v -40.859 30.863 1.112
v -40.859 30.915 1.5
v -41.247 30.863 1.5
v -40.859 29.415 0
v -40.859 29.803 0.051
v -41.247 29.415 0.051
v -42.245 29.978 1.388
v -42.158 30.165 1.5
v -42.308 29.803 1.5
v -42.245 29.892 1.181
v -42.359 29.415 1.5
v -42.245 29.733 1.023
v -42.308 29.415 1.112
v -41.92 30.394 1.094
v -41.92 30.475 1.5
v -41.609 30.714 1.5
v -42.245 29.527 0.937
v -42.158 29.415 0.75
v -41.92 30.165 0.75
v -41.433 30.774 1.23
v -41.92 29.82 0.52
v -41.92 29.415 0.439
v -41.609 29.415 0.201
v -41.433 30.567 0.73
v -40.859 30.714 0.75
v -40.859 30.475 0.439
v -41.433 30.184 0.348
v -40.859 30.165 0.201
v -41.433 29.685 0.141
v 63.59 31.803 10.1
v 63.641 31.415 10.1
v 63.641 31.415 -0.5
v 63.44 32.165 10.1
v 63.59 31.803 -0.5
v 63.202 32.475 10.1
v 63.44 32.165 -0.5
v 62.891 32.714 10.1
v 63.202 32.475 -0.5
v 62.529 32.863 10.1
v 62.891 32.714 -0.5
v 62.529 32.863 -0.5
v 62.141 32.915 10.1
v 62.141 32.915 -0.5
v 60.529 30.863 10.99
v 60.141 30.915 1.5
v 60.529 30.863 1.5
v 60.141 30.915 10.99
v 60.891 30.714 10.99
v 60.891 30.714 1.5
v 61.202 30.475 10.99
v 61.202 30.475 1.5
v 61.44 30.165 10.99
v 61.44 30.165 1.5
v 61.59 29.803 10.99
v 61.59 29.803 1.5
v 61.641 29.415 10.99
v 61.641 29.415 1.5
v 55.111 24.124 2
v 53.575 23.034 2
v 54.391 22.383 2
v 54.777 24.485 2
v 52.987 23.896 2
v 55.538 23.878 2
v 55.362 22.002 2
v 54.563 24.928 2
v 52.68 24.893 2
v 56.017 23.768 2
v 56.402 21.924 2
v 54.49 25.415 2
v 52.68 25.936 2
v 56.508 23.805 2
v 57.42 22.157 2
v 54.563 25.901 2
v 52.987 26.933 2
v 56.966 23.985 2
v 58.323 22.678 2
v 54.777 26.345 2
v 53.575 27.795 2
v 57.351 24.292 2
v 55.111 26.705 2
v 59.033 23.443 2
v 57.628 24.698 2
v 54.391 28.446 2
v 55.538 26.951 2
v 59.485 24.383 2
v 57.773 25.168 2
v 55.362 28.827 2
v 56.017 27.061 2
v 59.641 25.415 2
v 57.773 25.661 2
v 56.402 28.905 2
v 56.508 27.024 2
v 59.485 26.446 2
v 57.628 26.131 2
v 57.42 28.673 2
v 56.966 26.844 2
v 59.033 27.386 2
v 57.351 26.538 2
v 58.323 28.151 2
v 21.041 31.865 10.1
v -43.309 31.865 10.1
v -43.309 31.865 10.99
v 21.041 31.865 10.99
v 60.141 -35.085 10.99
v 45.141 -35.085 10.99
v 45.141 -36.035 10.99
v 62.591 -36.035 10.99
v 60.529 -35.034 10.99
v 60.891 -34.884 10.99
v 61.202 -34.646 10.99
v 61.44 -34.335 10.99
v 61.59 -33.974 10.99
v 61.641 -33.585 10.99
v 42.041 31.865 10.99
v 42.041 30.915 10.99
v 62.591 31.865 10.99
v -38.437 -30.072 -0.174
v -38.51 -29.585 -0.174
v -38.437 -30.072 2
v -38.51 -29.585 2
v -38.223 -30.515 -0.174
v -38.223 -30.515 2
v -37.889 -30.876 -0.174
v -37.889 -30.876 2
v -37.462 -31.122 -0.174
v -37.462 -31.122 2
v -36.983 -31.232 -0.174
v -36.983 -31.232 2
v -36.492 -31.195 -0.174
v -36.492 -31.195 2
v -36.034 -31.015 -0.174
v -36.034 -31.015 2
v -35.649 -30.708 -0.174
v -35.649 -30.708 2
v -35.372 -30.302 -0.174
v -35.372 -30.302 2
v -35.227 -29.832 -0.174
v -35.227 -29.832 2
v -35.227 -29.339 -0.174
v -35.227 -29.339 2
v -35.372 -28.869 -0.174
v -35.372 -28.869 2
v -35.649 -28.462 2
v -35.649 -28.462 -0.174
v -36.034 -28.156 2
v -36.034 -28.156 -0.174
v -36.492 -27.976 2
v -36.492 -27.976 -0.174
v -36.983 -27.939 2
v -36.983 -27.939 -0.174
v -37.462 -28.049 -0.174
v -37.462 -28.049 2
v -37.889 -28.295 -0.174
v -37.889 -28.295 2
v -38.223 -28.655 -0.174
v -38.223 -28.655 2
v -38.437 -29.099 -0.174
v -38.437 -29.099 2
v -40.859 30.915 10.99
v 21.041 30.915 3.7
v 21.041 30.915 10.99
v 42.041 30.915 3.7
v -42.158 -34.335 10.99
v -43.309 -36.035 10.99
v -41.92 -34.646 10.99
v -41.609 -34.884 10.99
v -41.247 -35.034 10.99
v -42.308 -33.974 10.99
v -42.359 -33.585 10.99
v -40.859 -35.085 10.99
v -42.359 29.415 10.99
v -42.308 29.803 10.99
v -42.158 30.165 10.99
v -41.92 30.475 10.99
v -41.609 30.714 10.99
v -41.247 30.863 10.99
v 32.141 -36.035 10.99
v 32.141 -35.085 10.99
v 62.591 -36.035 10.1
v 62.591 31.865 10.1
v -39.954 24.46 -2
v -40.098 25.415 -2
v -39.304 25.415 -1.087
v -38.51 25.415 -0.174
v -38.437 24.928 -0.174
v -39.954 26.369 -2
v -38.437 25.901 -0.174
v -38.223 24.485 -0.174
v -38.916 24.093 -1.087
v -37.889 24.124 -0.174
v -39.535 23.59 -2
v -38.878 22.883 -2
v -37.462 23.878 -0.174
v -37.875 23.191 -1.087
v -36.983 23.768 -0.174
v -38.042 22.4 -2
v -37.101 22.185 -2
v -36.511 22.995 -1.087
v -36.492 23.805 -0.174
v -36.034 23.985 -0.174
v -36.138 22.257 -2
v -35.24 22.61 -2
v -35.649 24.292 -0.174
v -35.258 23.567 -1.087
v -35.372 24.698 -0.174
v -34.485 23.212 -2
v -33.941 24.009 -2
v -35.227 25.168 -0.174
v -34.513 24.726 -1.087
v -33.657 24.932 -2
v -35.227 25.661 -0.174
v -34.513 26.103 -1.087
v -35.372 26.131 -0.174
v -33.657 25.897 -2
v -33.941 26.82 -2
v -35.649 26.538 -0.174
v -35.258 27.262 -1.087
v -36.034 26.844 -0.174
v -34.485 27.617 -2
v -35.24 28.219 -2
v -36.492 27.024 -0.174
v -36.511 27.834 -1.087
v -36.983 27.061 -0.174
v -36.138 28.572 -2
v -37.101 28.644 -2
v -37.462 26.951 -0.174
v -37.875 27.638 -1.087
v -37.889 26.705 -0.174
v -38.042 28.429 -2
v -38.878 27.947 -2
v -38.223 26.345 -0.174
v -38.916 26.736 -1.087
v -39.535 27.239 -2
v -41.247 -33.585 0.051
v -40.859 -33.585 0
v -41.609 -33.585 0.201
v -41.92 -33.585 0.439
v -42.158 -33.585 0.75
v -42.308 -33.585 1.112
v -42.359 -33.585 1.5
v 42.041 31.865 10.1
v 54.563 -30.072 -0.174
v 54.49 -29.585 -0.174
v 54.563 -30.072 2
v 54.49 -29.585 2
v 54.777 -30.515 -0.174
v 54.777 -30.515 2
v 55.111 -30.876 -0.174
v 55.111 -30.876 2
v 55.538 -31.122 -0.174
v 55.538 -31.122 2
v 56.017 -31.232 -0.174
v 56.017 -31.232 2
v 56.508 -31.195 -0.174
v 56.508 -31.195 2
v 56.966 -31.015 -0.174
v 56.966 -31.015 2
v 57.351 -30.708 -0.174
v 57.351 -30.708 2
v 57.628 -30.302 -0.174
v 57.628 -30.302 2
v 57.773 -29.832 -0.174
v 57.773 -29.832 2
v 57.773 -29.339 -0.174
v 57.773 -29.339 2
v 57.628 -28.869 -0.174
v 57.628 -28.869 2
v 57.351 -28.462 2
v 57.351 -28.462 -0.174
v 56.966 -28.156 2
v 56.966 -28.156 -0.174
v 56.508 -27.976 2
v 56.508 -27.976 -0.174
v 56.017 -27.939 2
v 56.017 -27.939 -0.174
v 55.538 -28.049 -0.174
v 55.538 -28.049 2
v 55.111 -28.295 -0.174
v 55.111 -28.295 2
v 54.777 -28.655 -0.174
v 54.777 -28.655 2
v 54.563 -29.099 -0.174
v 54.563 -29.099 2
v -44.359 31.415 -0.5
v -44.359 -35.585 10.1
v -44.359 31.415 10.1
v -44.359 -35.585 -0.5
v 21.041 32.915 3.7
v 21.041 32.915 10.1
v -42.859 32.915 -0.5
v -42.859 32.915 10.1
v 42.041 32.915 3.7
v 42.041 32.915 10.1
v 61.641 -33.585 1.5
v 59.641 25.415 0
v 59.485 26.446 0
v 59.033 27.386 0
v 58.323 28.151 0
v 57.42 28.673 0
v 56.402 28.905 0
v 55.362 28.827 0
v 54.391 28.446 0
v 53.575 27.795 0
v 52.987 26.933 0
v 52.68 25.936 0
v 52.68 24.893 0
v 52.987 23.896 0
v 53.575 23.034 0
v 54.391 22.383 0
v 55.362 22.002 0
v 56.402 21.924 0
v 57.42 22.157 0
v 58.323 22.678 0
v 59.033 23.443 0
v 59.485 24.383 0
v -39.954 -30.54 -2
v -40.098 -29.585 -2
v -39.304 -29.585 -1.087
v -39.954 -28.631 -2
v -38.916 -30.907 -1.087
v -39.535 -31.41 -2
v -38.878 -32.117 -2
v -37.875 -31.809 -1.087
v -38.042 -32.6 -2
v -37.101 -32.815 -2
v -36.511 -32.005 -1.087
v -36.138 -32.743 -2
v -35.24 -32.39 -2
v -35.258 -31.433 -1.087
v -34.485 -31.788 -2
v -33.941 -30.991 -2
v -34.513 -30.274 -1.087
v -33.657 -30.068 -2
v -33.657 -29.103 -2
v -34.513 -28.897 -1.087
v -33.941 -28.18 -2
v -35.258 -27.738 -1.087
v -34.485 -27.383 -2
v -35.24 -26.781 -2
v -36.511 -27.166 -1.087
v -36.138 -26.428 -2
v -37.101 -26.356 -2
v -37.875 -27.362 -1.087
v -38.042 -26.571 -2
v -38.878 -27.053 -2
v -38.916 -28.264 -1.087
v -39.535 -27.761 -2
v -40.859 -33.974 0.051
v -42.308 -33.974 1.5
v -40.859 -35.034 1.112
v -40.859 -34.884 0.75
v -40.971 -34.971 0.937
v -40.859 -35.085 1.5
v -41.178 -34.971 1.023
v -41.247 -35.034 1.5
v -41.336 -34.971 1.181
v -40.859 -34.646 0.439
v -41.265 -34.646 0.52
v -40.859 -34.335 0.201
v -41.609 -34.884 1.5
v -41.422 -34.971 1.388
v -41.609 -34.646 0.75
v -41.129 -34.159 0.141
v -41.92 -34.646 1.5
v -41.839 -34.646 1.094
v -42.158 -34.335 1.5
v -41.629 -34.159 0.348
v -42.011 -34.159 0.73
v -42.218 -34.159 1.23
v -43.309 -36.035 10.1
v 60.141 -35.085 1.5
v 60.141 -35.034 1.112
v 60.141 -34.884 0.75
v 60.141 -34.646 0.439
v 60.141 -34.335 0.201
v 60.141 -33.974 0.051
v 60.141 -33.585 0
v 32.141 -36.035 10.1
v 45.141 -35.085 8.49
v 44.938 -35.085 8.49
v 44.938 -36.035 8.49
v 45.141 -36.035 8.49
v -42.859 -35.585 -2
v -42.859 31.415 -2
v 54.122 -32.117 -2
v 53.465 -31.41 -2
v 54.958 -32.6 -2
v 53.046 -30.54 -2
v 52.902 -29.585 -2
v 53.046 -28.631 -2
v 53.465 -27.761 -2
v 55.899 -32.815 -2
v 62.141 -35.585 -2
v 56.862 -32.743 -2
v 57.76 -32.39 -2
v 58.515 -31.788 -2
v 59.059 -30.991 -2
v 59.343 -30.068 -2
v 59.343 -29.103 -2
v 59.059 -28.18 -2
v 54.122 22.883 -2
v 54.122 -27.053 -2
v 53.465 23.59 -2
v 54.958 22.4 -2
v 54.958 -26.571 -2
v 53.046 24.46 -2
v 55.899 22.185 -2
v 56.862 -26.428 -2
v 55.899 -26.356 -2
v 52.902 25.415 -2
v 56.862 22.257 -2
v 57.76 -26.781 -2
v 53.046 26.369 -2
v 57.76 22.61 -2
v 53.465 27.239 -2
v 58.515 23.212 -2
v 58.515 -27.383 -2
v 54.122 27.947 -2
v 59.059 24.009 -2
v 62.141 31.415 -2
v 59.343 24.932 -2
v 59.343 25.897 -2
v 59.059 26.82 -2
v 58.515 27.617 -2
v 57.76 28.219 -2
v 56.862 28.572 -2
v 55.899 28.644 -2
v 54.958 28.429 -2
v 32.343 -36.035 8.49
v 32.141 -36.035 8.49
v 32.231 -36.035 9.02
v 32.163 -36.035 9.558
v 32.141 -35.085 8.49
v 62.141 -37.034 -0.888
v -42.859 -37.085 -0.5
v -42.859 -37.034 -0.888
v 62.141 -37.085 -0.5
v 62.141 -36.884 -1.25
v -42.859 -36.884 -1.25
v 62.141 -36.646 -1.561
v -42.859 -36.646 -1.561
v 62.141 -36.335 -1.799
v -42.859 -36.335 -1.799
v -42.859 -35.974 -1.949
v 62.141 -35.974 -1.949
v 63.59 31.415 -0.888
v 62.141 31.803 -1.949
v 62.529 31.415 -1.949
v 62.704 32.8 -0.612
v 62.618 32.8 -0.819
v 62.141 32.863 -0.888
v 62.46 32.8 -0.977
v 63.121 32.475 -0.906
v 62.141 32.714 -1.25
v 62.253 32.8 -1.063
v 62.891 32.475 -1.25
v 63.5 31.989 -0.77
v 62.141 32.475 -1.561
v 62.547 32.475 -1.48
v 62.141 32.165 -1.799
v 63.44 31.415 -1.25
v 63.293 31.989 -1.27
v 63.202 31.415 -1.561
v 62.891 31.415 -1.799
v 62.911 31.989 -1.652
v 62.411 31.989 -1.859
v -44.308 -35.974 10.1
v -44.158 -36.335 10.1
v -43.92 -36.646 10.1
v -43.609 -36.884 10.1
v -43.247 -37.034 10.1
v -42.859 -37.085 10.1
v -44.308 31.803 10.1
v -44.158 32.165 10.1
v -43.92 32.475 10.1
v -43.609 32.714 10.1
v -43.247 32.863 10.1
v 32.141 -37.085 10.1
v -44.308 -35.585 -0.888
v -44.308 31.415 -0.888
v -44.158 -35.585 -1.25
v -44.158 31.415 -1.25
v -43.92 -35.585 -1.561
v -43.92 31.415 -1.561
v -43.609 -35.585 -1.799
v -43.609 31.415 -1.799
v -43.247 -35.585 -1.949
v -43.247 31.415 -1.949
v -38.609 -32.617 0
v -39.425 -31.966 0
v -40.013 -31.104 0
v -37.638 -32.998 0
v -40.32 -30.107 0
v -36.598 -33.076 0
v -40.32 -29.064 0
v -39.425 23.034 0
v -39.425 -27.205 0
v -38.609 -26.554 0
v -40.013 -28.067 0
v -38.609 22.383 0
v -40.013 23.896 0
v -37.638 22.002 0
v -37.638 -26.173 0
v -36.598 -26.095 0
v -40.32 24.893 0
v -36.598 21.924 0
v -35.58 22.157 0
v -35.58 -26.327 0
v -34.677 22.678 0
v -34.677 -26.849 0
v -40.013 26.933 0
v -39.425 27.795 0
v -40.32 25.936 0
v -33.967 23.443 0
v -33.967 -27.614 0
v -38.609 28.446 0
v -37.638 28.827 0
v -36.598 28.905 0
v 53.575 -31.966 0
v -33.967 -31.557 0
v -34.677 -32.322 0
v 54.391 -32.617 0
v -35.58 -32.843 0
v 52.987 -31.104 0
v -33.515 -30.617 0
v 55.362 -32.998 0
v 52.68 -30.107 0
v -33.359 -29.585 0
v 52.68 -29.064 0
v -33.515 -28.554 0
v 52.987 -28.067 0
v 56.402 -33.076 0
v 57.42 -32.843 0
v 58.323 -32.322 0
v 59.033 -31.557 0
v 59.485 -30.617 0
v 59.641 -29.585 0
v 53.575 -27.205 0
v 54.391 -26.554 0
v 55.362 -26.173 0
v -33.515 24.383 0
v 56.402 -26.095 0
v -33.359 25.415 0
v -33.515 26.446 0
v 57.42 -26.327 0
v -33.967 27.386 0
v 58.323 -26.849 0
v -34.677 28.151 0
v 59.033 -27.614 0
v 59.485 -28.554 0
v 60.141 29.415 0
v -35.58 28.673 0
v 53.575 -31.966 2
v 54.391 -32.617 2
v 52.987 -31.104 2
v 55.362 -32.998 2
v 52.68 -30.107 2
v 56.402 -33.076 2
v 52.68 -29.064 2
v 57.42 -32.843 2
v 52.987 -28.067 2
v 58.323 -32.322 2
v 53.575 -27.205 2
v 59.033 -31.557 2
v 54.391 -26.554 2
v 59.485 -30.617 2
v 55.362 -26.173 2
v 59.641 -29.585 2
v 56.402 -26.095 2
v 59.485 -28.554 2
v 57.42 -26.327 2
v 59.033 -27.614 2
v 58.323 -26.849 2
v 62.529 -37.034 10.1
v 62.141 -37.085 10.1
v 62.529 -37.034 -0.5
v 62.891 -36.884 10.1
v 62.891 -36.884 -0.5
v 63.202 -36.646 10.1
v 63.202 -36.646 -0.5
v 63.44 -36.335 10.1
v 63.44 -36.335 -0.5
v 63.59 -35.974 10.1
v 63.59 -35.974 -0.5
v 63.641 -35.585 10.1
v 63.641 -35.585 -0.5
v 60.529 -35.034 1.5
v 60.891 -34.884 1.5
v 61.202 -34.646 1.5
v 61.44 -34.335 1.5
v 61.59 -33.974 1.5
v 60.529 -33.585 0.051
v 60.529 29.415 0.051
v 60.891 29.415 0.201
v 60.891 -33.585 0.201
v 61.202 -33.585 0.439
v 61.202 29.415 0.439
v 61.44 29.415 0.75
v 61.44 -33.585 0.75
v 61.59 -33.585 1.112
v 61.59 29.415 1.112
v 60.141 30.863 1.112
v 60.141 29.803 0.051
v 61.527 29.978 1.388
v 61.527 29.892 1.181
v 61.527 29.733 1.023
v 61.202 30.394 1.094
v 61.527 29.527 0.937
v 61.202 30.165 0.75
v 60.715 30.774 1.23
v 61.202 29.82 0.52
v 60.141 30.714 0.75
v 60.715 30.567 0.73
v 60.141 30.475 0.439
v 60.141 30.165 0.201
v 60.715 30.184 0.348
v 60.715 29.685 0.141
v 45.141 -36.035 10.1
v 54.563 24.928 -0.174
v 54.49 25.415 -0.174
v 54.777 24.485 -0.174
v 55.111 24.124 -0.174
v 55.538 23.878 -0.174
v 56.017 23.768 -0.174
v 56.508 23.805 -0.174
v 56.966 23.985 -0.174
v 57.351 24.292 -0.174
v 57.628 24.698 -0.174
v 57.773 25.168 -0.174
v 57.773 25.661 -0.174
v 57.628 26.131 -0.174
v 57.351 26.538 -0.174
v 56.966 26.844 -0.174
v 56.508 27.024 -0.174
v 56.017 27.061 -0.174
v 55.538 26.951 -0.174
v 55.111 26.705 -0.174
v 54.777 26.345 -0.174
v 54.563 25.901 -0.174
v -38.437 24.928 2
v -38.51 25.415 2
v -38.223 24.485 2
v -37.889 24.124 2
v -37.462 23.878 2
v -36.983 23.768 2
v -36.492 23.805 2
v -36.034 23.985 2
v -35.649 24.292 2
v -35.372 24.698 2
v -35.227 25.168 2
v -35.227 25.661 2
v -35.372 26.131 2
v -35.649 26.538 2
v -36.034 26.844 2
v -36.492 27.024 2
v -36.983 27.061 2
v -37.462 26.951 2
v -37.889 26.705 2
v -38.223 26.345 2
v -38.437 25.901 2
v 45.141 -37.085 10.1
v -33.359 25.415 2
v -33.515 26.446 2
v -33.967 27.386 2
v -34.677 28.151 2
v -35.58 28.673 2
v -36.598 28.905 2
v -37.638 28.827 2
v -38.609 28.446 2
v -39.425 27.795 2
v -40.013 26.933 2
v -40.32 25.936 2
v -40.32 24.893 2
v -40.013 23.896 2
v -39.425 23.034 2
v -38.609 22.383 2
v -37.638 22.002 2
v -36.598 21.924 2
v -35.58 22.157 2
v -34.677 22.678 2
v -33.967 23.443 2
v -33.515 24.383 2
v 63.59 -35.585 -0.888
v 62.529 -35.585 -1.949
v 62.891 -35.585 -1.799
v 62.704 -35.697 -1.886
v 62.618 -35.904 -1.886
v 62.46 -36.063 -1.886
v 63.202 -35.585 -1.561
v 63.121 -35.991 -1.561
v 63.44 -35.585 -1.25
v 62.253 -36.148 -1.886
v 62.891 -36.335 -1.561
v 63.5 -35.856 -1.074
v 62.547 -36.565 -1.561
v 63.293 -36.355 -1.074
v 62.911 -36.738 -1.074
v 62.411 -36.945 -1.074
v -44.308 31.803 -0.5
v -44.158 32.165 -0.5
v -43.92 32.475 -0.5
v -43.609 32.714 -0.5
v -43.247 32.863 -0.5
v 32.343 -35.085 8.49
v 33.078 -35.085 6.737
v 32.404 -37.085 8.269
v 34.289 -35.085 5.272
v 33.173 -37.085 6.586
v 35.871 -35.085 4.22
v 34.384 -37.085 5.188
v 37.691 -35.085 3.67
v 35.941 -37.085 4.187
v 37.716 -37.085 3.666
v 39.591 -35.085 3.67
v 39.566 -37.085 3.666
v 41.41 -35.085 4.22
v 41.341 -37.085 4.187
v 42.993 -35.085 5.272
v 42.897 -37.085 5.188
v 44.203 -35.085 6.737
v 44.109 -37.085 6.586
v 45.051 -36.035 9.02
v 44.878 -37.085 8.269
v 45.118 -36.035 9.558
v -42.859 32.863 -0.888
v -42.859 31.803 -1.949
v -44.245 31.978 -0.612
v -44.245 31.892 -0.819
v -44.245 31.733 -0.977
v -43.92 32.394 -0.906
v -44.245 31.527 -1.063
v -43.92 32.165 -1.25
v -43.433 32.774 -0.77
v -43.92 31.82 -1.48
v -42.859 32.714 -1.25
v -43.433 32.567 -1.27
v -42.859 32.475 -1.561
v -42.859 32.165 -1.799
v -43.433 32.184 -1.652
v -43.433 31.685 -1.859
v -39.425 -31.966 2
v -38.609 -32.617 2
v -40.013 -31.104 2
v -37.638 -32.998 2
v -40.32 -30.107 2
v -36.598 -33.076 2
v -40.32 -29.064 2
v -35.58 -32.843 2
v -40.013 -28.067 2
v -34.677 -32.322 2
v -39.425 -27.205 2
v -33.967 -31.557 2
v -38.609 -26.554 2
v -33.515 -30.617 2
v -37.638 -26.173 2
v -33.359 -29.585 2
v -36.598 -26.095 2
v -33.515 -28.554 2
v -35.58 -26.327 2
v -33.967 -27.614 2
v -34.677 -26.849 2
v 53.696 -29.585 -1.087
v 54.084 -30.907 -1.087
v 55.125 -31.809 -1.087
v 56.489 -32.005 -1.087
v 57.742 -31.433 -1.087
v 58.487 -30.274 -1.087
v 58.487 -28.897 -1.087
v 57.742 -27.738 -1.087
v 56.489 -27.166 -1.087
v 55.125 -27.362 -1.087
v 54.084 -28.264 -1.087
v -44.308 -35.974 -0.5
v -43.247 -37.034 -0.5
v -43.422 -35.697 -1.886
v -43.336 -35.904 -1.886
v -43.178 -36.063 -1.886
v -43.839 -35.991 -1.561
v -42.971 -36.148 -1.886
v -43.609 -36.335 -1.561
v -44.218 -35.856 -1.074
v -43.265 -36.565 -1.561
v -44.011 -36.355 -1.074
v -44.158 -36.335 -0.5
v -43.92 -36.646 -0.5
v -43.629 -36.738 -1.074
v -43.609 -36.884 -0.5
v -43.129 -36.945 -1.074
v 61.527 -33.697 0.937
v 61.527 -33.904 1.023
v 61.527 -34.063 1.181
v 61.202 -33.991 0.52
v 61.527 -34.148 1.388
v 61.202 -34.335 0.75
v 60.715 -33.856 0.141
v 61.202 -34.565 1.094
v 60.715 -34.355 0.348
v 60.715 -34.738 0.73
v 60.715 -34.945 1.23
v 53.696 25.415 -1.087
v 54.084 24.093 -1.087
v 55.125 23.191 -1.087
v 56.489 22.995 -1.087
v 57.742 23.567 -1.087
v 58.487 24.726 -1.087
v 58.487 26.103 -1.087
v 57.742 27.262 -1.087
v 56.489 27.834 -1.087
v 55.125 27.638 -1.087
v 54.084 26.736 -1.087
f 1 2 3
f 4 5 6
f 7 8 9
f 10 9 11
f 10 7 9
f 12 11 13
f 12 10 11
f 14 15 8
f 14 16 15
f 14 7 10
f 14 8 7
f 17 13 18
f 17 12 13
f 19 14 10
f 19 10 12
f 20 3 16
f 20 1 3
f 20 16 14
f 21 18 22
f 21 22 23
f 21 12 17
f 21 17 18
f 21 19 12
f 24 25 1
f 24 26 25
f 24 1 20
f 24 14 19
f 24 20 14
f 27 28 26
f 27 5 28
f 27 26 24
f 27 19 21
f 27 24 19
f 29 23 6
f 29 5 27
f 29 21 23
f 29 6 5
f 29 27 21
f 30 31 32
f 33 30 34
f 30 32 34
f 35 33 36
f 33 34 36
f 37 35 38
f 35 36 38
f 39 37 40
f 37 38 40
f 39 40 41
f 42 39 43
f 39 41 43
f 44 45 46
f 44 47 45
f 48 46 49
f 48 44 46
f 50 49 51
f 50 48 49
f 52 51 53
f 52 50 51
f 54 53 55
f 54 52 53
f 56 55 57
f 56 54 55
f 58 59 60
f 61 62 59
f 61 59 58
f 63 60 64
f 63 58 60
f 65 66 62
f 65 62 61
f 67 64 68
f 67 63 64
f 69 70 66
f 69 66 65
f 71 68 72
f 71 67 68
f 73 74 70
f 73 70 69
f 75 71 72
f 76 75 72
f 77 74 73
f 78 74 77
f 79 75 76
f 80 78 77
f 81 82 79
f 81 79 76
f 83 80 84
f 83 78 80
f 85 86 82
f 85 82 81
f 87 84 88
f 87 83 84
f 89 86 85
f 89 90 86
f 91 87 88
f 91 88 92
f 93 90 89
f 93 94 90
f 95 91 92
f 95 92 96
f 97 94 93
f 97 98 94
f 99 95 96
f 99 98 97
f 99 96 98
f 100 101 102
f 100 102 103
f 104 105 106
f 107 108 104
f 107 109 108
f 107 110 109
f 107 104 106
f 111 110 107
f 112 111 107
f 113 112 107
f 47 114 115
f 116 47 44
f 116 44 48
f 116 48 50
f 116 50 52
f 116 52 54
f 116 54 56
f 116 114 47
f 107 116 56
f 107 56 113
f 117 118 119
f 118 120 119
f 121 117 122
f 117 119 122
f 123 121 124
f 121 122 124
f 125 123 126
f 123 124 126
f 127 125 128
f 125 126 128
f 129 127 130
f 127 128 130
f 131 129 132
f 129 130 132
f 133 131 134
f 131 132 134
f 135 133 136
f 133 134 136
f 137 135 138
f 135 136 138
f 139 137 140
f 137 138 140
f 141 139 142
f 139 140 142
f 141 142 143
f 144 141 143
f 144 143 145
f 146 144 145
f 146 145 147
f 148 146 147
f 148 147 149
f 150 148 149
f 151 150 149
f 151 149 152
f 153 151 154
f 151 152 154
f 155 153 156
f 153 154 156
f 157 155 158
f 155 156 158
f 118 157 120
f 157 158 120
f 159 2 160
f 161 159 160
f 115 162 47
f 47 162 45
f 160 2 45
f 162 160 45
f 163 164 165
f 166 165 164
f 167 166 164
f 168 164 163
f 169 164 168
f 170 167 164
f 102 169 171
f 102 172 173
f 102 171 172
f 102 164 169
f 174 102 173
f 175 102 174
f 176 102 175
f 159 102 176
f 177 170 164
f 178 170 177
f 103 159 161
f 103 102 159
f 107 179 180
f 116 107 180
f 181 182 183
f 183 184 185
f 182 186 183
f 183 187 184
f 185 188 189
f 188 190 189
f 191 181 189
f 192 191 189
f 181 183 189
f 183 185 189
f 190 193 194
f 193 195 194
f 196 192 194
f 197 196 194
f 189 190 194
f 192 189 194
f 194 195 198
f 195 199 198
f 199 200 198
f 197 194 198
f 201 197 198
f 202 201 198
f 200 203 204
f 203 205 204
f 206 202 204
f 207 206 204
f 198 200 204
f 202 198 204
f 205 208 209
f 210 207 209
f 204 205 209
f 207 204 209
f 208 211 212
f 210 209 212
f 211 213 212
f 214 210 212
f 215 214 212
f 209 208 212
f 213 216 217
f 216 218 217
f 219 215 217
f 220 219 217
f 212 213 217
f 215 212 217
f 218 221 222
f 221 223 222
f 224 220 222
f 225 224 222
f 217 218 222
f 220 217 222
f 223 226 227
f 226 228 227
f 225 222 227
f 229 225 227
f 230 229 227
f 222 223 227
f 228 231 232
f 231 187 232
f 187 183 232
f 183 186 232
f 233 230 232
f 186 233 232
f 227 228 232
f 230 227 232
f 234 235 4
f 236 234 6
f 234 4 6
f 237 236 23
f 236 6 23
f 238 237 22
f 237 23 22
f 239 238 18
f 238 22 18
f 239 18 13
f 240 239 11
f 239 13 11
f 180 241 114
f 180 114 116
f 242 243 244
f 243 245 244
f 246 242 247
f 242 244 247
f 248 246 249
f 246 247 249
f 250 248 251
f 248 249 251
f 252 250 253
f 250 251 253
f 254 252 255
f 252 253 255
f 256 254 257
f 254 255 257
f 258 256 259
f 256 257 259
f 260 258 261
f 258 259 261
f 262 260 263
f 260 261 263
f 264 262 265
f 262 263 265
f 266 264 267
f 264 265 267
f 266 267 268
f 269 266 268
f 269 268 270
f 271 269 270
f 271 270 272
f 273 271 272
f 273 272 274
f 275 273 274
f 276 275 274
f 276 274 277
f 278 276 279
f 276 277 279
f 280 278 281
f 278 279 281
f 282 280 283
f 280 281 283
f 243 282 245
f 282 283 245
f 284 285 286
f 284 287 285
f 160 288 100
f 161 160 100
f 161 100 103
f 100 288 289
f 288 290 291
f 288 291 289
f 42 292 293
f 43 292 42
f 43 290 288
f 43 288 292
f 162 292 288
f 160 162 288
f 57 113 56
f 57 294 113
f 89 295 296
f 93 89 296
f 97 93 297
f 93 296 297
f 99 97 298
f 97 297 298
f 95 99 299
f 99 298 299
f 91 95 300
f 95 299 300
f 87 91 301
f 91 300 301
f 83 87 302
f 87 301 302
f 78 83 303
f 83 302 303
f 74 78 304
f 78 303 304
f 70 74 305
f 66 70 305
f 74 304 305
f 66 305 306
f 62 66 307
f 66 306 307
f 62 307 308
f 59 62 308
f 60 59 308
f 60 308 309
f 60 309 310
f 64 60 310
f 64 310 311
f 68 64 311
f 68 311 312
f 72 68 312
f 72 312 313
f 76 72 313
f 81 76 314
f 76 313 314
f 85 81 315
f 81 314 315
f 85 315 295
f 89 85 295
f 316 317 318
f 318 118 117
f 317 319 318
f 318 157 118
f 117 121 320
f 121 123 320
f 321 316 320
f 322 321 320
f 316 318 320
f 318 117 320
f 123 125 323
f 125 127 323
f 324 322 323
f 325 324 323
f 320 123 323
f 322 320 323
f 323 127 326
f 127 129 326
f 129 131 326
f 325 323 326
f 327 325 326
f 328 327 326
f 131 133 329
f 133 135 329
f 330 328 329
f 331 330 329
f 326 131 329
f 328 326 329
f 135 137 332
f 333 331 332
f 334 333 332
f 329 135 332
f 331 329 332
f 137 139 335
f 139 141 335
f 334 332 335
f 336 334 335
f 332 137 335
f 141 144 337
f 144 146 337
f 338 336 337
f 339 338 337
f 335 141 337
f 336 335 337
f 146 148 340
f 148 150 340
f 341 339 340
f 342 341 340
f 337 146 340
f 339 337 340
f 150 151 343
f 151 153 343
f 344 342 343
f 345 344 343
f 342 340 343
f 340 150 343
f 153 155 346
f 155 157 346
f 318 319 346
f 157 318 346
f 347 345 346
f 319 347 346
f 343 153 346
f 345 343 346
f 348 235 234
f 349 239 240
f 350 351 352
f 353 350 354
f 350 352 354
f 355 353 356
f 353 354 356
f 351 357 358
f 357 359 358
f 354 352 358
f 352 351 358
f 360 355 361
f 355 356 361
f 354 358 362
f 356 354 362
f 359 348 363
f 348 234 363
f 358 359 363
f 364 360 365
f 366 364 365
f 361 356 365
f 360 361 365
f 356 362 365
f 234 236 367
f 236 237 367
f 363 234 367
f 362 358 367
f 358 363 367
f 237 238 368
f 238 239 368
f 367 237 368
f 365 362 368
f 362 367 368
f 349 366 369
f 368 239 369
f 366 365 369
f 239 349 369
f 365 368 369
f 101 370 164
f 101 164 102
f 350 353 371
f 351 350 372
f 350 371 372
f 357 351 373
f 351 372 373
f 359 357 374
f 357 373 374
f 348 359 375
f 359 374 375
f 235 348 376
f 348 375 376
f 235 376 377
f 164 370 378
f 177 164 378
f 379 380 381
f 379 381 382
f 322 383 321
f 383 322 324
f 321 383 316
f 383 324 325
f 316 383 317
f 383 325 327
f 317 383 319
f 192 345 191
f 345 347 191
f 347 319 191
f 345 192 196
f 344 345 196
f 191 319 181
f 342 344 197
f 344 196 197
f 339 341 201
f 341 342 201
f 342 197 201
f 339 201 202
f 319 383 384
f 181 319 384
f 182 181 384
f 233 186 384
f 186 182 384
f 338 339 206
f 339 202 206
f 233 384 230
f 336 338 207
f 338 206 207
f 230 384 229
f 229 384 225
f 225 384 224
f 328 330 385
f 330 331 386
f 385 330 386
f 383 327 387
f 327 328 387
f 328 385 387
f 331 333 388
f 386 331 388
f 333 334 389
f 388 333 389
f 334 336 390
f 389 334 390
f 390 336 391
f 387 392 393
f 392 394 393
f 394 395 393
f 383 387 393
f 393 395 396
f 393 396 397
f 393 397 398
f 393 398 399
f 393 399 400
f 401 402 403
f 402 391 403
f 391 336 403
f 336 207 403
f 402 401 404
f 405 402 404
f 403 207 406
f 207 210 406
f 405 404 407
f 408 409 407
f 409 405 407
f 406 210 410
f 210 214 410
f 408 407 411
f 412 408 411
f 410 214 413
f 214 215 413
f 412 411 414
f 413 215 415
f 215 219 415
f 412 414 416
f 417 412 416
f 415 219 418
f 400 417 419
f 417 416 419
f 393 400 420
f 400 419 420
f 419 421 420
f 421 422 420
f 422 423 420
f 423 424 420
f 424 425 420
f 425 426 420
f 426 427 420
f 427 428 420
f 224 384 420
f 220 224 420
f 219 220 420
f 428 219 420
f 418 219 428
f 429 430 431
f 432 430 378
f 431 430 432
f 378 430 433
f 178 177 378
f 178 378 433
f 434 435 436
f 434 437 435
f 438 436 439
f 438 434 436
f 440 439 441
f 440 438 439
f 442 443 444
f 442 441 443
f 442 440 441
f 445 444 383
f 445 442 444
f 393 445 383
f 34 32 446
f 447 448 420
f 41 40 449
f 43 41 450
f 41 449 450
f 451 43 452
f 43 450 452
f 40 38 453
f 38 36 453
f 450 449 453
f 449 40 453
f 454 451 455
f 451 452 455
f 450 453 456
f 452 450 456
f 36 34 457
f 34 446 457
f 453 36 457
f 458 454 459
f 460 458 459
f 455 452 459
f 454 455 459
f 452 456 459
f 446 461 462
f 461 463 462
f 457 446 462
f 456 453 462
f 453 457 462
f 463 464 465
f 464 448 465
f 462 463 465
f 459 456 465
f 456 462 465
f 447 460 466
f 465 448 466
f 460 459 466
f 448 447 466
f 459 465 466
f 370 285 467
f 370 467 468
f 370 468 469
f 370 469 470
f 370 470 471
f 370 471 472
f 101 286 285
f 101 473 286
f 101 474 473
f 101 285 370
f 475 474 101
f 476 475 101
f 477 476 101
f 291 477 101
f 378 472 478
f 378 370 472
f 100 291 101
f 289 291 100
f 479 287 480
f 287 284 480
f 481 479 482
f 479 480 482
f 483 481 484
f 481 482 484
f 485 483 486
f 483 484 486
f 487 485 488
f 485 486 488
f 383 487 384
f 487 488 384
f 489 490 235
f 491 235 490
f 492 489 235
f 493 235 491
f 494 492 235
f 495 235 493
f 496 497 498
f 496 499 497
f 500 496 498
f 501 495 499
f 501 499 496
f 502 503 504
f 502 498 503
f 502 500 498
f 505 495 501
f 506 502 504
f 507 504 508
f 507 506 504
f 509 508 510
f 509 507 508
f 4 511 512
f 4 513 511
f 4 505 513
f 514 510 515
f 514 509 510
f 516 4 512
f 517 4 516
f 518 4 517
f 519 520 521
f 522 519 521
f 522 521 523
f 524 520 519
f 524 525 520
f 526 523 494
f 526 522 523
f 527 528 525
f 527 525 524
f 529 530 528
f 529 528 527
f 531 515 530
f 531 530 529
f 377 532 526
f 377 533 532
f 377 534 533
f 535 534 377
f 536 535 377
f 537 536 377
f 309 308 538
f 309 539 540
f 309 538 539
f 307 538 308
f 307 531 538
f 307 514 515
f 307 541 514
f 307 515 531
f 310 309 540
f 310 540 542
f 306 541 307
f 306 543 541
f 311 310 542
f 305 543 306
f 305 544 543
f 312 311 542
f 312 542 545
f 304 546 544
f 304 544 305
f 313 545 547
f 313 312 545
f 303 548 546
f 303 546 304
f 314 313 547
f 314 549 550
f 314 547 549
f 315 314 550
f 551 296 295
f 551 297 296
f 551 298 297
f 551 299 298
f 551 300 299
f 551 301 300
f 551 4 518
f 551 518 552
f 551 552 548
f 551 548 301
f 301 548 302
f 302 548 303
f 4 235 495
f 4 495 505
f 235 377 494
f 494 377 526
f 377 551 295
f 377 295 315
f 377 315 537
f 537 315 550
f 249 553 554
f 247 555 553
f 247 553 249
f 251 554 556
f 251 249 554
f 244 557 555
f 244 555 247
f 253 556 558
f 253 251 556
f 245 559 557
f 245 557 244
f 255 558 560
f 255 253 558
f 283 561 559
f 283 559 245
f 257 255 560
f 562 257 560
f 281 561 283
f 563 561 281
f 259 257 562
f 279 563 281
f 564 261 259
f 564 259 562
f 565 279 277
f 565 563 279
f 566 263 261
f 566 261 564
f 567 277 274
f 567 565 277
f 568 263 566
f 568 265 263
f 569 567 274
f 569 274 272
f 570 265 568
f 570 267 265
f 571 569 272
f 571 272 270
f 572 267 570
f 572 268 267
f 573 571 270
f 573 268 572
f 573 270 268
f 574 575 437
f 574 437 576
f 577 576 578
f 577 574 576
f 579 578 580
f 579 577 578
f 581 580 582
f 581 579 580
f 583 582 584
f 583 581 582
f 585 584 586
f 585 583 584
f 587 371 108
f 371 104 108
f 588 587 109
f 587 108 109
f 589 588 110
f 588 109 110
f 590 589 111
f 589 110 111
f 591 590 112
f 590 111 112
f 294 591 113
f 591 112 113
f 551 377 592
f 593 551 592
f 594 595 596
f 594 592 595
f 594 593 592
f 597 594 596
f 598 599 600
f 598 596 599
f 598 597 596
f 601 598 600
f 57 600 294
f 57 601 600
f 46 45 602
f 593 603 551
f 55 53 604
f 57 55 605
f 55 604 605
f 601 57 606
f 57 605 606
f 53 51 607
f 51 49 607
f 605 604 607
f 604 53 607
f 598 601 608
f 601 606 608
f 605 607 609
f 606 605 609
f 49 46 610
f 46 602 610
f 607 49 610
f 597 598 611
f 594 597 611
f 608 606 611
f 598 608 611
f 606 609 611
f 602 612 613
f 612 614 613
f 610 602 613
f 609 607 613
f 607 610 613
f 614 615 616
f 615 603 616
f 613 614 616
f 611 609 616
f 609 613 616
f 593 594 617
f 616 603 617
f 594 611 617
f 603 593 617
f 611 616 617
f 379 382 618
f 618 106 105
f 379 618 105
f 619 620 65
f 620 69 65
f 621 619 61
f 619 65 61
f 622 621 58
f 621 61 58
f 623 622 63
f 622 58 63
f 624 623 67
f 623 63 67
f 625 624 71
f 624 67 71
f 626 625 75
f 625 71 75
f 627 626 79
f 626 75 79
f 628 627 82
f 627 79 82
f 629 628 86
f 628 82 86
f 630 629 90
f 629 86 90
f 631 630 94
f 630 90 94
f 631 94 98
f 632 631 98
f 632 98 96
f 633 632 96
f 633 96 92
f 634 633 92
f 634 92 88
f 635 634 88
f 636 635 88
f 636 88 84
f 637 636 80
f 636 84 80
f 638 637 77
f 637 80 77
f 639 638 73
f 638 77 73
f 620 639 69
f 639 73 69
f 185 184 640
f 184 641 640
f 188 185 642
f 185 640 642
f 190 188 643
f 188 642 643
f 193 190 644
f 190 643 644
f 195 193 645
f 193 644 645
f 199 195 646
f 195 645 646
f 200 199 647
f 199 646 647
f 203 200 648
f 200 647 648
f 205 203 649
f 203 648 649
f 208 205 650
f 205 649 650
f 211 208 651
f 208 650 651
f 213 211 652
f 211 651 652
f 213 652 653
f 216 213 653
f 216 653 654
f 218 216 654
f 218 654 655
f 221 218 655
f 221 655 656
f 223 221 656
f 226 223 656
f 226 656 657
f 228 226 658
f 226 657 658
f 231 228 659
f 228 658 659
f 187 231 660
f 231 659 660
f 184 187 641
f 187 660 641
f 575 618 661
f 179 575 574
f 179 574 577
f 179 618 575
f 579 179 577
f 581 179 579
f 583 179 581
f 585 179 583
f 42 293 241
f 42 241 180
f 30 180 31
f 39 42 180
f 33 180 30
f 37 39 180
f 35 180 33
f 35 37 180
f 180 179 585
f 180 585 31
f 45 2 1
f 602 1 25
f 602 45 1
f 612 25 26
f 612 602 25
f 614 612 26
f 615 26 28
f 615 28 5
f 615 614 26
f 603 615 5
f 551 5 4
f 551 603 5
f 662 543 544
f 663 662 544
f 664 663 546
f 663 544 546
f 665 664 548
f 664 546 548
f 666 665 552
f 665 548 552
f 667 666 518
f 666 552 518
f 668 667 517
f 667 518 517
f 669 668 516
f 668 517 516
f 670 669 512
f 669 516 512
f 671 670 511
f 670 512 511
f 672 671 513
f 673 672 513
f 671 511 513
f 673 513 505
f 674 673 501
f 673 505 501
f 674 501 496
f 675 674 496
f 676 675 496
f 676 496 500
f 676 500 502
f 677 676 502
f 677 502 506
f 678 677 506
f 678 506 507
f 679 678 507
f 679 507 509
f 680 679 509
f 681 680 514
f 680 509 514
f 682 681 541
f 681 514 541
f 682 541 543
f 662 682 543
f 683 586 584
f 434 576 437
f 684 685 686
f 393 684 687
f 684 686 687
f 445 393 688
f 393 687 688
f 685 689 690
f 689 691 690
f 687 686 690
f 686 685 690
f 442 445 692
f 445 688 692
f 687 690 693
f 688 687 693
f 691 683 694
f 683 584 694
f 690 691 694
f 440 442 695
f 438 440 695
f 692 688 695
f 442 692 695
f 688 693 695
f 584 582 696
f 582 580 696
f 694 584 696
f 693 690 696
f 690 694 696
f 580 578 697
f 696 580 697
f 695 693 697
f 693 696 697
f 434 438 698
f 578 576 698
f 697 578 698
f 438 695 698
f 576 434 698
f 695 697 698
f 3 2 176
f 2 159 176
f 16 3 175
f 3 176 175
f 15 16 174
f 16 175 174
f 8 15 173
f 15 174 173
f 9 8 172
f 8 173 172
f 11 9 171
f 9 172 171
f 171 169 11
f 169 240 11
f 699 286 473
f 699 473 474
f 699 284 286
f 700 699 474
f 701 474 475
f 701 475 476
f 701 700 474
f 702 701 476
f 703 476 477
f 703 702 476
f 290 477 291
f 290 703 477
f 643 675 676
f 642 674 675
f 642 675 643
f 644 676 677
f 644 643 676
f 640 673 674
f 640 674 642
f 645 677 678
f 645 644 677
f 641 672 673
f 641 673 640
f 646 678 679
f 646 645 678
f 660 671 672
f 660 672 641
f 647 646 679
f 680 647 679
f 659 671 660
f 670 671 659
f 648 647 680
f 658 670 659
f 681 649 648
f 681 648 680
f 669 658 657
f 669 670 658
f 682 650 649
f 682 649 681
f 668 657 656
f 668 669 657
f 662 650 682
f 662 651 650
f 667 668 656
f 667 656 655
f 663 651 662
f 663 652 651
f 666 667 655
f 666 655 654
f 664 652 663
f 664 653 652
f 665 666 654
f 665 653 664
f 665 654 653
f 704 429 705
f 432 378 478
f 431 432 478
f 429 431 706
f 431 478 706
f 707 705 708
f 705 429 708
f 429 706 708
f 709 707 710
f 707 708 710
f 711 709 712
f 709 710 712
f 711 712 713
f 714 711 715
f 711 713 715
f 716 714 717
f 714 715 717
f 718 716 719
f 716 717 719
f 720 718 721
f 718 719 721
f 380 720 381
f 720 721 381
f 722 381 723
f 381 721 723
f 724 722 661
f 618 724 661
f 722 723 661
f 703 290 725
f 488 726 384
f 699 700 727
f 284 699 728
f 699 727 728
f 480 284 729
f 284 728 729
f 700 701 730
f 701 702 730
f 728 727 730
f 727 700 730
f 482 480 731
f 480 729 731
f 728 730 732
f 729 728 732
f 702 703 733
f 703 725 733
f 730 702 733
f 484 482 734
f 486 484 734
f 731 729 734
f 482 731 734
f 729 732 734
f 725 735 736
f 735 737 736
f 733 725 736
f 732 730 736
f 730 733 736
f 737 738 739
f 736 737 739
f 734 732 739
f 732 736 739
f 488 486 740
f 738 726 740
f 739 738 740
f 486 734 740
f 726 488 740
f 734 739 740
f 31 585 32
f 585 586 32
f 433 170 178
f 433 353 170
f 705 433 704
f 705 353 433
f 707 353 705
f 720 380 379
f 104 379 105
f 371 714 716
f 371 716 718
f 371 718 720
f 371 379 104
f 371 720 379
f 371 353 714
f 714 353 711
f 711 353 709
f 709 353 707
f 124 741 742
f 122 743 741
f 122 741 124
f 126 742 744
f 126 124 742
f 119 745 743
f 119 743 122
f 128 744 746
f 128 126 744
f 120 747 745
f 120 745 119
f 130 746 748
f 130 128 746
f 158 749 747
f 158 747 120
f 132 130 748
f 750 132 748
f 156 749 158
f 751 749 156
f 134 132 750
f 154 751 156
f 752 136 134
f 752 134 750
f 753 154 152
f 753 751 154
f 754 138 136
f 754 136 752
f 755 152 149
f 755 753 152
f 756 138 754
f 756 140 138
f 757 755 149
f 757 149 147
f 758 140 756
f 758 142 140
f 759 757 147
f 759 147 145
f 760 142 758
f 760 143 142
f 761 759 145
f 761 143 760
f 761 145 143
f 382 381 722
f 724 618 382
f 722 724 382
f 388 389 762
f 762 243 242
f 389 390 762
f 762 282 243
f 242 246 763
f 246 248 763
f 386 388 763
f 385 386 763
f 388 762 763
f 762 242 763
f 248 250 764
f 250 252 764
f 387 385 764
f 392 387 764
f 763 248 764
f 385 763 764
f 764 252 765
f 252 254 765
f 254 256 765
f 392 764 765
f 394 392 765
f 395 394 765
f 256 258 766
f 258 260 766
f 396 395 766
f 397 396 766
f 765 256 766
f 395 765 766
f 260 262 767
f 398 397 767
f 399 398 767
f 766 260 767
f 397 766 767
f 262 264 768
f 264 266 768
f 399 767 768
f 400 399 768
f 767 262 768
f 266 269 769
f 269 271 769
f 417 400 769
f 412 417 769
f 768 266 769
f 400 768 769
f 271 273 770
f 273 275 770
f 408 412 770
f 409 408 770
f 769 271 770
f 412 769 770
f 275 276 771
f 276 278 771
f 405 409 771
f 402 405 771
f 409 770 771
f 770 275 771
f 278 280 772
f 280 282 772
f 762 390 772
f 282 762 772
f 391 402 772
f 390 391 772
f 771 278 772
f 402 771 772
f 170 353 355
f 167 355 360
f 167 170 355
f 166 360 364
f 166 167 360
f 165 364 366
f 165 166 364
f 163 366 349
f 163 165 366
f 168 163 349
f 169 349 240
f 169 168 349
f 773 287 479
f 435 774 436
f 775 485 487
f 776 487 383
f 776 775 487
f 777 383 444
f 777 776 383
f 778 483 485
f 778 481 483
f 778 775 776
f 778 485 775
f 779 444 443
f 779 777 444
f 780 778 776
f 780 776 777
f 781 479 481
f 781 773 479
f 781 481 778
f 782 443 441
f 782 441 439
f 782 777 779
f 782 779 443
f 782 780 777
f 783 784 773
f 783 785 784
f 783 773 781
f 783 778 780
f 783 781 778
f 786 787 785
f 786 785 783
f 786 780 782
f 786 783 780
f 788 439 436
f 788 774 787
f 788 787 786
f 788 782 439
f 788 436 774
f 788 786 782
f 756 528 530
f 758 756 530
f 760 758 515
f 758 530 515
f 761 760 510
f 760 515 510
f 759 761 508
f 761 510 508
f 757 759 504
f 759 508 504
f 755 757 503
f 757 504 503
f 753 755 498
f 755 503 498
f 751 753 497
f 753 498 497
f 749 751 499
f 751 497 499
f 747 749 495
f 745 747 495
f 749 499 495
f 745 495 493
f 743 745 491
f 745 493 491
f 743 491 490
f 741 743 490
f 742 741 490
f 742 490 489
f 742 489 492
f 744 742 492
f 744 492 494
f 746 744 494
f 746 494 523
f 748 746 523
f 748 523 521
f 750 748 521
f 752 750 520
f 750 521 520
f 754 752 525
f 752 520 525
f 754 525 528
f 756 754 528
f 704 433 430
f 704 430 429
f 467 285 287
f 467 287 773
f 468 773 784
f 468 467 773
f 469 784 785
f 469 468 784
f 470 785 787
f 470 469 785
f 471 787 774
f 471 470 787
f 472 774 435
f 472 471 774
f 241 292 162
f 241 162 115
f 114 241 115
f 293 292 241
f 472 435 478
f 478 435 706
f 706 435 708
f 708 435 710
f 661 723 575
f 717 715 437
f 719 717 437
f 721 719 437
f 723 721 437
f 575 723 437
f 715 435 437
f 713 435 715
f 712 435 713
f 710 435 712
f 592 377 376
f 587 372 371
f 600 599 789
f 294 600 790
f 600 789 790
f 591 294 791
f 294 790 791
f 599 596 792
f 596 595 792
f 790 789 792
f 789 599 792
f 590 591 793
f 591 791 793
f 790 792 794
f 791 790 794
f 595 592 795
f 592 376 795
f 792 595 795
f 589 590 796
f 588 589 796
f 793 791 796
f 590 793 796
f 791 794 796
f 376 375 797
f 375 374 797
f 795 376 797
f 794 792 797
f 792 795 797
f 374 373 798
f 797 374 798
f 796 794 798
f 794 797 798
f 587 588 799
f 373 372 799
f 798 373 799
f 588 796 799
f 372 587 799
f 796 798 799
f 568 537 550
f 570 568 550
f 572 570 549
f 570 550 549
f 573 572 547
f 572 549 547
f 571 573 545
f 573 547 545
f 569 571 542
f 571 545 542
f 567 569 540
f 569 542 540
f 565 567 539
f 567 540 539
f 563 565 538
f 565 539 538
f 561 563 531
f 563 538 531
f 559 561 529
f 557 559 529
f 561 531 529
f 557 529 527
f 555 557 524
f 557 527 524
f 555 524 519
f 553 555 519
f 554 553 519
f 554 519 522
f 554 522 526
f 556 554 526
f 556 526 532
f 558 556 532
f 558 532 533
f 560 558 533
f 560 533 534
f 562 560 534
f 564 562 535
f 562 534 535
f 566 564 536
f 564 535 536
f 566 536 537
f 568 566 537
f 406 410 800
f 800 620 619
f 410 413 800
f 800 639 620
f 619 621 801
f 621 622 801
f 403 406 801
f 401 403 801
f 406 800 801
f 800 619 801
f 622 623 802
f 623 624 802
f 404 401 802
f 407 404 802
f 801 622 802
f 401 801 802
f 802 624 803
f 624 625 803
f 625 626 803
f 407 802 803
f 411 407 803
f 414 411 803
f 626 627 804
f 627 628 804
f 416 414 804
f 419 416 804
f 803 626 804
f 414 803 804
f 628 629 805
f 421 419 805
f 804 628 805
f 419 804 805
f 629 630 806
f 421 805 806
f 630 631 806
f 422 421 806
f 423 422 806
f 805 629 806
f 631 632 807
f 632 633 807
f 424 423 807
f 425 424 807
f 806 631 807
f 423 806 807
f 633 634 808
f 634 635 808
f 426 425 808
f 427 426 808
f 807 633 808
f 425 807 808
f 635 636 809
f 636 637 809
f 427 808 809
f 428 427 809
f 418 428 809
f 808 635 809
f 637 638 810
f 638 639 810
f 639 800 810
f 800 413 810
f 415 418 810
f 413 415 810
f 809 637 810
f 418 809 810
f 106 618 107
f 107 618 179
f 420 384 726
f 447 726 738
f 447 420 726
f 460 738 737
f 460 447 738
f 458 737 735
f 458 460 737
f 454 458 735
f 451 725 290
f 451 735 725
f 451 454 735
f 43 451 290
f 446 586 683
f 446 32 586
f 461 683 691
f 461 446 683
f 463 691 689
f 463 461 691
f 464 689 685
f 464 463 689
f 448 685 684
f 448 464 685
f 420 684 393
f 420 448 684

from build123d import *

# Parameters (mm, degrees)
F0_W           = 108
F0_H           = 70
F0_W_2         = 105.9
F0_H_2         = 67.9
F0_W_3         = 104
F0_H_3         = 66
F0_R           = 3
F1_DEPTH       = 2
F2_DEPTH       = 10.99
F3_DEPTH       = 10.1
F4_R           = 3.5
F5_DEPTH       = 2
F7_D           = 3.302
F7_CSINK_D     = 6.477
F7_CSINK_ANGLE = 82
F8_W           = 21
F8_H           = 6.4
F9_DEPTH       = 2.5
F10_W          = 13
F10_H          = 0.95
F11_DEPTH      = 2.5
F13_DEPTH      = 2.5
F14_R          = 1.5
F15_R          = 1.5
F16_W          = 21
F16_H          = 0.89
F17_DEPTH      = 2.5


# Not quite as in the source:
# - a feature names something its author has since deleted; it is built from what else it names


with BuildPart() as f1:
    # F0 (on Top) → F1 (new body)
    with BuildSketch(Plane.XY):
        with Locations((9.6408709802, -2.0854342729)):
            Rectangle(F0_W, F0_H)
        with Locations((9.6408709802, -2.0854342729)):
            Rectangle(F0_W_2, F0_H_2, mode=Mode.SUBTRACT)
        with Locations((9.6408709802, -2.0854342729)):
            Rectangle(F0_W_2, F0_H_2)
        with Locations((9.6408709802, -2.0854342729)):
            Rectangle(F0_W_3, F0_H_3, mode=Mode.SUBTRACT)
        with Locations((9.6408709802, -2.0854342729)):
            Rectangle(F0_W_3, F0_H_3)
        with Locations((-36.8591290198, -29.5854342729)):
            Circle(F0_R, mode=Mode.SUBTRACT)
        with Locations((54.9200624228, -29.5854342729)):
            Circle(F0_R, mode=Mode.SUBTRACT)
        with Locations((-36.8591290198, 25.4145657271)):
            Circle(F0_R, mode=Mode.SUBTRACT)
        with Locations((57.1408709802, 25.4145657271)):
            Circle(F0_R, mode=Mode.SUBTRACT)
        with Locations((-36.8591290198, -29.5854342729)):
            Circle(F0_R)
        with Locations((54.9200624228, -29.5854342729)):
            Circle(F0_R)
        with Locations((-36.8591290198, 25.4145657271)):
            Circle(F0_R)
        with Locations((57.1408709802, 25.4145657271)):
            Circle(F0_R)
    extrude(amount=-F1_DEPTH)

    # F0 (on Top) → F2 (join)
    with BuildSketch(Plane.XY):
        with Locations((9.6408709802, -2.0854342729)):
            Rectangle(F0_W_2, F0_H_2)
        with Locations((9.6408709802, -2.0854342729)):
            Rectangle(F0_W_3, F0_H_3, mode=Mode.SUBTRACT)
    extrude(amount=F2_DEPTH)

    # F0 (on Top) → F3 (join)
    with BuildSketch(Plane.XY):
        with Locations((9.6408709802, -2.0854342729)):
            Rectangle(F0_W, F0_H)
        with Locations((9.6408709802, -2.0854342729)):
            Rectangle(F0_W_2, F0_H_2, mode=Mode.SUBTRACT)
    extrude(amount=F3_DEPTH)

    # F4 (on face) → F5 (join)
    with BuildSketch(Plane.XY):
        with Locations((-36.8591290198, 25.4145657271)):
            Circle(F4_R)
        with Locations((56.1408709802, 25.4145657271)):
            Circle(F4_R)
        with Locations((56.1408709802, -29.5854342729)):
            Circle(F4_R)
        with Locations((-36.8591290198, -29.5854342729)):
            Circle(F4_R)
    extrude(amount=F5_DEPTH)

    # F7 (through all)
    with Locations(Plane(origin=(0, 0, -2), x_dir=(1, 0, 0), z_dir=(0, 0, -1))):
        with Locations((-36.8591290198, 29.5854342729), (56.1408709802, 29.5854342729), (56.1408709802, -25.4145657271), (-36.8591290198, -25.4145657271)):
            CounterSinkHole(F7_D / 2, F7_CSINK_D / 2, counter_sink_angle=F7_CSINK_ANGLE)

    # F8 (on face) → F9 (cut)
    with BuildSketch(Plane(origin=(0, 32.9145657271, 0), x_dir=(-1, 0, 0), z_dir=(0, 1, 0))):
        with Locations((-31.5408709802, 6.9)):
            Rectangle(F8_W, F8_H)
    extrude(amount=-F9_DEPTH, mode=Mode.SUBTRACT)

    # F10 (on face) → F11 (cut)
    with BuildSketch(Plane.XY.offset(10.99)):
        with Locations((38.6408709802, -35.5604342729)):
            Rectangle(F10_W, F10_H)
    extrude(amount=-F11_DEPTH, mode=Mode.SUBTRACT)

    # F12 (on face) → F13 (cut)
    with BuildSketch(Plane.XZ.offset(37.0854342729)):
        with BuildLine():
            ThreePointArc((32.1408709802, 10.1), (38.6408709802, 3.6), (45.1408709802, 10.1))
            Line((45.1408709802, 10.1), (32.1408709802, 10.1))
        make_face()
    extrude(amount=-F13_DEPTH, mode=Mode.SUBTRACT)

    # F14
    f14_edges = [f1.edges().sort_by_distance(p)[0] for p in [
        (63.640871, -37.085434, 4.05),
        (63.640871, -2.085434, -2),
        (63.640871, 32.914566, 4.05),
        (9.640871, 32.914566, -2),
        (-44.359129, 32.914566, 4.05),
        (-44.359129, -37.085434, 4.05),
        (-44.359129, -2.085434, -2),
        (9.640871, -37.085434, -2),
    ]]
    fillet(f14_edges, radius=F14_R)

    # F15
    f15_edges = [f1.edges().sort_by_distance(p)[0] for p in [
        (9.640871, 30.914566, 0),
        (-42.359129, 30.914566, 5.495),
        (-42.359129, -2.085434, 0),
        (9.640871, -35.085434, 0),
        (-42.359129, -35.085434, 5.495),
        (61.640871, 30.914566, 5.495),
        (61.640871, -2.085434, 0),
        (61.640871, -35.085434, 5.495),
    ]]
    fillet(f15_edges, radius=F15_R)

    # F16 (on face) → F17 (cut)
    with BuildSketch(Plane(origin=(0, 31.8645657271, 0), x_dir=(-1, 0, 0), z_dir=(0, 1, 0))):
        with Locations((-31.5408709802, 10.545)):
            Rectangle(F16_W, F16_H)
    extrude(amount=-F17_DEPTH, mode=Mode.SUBTRACT)


solid = f1.part
